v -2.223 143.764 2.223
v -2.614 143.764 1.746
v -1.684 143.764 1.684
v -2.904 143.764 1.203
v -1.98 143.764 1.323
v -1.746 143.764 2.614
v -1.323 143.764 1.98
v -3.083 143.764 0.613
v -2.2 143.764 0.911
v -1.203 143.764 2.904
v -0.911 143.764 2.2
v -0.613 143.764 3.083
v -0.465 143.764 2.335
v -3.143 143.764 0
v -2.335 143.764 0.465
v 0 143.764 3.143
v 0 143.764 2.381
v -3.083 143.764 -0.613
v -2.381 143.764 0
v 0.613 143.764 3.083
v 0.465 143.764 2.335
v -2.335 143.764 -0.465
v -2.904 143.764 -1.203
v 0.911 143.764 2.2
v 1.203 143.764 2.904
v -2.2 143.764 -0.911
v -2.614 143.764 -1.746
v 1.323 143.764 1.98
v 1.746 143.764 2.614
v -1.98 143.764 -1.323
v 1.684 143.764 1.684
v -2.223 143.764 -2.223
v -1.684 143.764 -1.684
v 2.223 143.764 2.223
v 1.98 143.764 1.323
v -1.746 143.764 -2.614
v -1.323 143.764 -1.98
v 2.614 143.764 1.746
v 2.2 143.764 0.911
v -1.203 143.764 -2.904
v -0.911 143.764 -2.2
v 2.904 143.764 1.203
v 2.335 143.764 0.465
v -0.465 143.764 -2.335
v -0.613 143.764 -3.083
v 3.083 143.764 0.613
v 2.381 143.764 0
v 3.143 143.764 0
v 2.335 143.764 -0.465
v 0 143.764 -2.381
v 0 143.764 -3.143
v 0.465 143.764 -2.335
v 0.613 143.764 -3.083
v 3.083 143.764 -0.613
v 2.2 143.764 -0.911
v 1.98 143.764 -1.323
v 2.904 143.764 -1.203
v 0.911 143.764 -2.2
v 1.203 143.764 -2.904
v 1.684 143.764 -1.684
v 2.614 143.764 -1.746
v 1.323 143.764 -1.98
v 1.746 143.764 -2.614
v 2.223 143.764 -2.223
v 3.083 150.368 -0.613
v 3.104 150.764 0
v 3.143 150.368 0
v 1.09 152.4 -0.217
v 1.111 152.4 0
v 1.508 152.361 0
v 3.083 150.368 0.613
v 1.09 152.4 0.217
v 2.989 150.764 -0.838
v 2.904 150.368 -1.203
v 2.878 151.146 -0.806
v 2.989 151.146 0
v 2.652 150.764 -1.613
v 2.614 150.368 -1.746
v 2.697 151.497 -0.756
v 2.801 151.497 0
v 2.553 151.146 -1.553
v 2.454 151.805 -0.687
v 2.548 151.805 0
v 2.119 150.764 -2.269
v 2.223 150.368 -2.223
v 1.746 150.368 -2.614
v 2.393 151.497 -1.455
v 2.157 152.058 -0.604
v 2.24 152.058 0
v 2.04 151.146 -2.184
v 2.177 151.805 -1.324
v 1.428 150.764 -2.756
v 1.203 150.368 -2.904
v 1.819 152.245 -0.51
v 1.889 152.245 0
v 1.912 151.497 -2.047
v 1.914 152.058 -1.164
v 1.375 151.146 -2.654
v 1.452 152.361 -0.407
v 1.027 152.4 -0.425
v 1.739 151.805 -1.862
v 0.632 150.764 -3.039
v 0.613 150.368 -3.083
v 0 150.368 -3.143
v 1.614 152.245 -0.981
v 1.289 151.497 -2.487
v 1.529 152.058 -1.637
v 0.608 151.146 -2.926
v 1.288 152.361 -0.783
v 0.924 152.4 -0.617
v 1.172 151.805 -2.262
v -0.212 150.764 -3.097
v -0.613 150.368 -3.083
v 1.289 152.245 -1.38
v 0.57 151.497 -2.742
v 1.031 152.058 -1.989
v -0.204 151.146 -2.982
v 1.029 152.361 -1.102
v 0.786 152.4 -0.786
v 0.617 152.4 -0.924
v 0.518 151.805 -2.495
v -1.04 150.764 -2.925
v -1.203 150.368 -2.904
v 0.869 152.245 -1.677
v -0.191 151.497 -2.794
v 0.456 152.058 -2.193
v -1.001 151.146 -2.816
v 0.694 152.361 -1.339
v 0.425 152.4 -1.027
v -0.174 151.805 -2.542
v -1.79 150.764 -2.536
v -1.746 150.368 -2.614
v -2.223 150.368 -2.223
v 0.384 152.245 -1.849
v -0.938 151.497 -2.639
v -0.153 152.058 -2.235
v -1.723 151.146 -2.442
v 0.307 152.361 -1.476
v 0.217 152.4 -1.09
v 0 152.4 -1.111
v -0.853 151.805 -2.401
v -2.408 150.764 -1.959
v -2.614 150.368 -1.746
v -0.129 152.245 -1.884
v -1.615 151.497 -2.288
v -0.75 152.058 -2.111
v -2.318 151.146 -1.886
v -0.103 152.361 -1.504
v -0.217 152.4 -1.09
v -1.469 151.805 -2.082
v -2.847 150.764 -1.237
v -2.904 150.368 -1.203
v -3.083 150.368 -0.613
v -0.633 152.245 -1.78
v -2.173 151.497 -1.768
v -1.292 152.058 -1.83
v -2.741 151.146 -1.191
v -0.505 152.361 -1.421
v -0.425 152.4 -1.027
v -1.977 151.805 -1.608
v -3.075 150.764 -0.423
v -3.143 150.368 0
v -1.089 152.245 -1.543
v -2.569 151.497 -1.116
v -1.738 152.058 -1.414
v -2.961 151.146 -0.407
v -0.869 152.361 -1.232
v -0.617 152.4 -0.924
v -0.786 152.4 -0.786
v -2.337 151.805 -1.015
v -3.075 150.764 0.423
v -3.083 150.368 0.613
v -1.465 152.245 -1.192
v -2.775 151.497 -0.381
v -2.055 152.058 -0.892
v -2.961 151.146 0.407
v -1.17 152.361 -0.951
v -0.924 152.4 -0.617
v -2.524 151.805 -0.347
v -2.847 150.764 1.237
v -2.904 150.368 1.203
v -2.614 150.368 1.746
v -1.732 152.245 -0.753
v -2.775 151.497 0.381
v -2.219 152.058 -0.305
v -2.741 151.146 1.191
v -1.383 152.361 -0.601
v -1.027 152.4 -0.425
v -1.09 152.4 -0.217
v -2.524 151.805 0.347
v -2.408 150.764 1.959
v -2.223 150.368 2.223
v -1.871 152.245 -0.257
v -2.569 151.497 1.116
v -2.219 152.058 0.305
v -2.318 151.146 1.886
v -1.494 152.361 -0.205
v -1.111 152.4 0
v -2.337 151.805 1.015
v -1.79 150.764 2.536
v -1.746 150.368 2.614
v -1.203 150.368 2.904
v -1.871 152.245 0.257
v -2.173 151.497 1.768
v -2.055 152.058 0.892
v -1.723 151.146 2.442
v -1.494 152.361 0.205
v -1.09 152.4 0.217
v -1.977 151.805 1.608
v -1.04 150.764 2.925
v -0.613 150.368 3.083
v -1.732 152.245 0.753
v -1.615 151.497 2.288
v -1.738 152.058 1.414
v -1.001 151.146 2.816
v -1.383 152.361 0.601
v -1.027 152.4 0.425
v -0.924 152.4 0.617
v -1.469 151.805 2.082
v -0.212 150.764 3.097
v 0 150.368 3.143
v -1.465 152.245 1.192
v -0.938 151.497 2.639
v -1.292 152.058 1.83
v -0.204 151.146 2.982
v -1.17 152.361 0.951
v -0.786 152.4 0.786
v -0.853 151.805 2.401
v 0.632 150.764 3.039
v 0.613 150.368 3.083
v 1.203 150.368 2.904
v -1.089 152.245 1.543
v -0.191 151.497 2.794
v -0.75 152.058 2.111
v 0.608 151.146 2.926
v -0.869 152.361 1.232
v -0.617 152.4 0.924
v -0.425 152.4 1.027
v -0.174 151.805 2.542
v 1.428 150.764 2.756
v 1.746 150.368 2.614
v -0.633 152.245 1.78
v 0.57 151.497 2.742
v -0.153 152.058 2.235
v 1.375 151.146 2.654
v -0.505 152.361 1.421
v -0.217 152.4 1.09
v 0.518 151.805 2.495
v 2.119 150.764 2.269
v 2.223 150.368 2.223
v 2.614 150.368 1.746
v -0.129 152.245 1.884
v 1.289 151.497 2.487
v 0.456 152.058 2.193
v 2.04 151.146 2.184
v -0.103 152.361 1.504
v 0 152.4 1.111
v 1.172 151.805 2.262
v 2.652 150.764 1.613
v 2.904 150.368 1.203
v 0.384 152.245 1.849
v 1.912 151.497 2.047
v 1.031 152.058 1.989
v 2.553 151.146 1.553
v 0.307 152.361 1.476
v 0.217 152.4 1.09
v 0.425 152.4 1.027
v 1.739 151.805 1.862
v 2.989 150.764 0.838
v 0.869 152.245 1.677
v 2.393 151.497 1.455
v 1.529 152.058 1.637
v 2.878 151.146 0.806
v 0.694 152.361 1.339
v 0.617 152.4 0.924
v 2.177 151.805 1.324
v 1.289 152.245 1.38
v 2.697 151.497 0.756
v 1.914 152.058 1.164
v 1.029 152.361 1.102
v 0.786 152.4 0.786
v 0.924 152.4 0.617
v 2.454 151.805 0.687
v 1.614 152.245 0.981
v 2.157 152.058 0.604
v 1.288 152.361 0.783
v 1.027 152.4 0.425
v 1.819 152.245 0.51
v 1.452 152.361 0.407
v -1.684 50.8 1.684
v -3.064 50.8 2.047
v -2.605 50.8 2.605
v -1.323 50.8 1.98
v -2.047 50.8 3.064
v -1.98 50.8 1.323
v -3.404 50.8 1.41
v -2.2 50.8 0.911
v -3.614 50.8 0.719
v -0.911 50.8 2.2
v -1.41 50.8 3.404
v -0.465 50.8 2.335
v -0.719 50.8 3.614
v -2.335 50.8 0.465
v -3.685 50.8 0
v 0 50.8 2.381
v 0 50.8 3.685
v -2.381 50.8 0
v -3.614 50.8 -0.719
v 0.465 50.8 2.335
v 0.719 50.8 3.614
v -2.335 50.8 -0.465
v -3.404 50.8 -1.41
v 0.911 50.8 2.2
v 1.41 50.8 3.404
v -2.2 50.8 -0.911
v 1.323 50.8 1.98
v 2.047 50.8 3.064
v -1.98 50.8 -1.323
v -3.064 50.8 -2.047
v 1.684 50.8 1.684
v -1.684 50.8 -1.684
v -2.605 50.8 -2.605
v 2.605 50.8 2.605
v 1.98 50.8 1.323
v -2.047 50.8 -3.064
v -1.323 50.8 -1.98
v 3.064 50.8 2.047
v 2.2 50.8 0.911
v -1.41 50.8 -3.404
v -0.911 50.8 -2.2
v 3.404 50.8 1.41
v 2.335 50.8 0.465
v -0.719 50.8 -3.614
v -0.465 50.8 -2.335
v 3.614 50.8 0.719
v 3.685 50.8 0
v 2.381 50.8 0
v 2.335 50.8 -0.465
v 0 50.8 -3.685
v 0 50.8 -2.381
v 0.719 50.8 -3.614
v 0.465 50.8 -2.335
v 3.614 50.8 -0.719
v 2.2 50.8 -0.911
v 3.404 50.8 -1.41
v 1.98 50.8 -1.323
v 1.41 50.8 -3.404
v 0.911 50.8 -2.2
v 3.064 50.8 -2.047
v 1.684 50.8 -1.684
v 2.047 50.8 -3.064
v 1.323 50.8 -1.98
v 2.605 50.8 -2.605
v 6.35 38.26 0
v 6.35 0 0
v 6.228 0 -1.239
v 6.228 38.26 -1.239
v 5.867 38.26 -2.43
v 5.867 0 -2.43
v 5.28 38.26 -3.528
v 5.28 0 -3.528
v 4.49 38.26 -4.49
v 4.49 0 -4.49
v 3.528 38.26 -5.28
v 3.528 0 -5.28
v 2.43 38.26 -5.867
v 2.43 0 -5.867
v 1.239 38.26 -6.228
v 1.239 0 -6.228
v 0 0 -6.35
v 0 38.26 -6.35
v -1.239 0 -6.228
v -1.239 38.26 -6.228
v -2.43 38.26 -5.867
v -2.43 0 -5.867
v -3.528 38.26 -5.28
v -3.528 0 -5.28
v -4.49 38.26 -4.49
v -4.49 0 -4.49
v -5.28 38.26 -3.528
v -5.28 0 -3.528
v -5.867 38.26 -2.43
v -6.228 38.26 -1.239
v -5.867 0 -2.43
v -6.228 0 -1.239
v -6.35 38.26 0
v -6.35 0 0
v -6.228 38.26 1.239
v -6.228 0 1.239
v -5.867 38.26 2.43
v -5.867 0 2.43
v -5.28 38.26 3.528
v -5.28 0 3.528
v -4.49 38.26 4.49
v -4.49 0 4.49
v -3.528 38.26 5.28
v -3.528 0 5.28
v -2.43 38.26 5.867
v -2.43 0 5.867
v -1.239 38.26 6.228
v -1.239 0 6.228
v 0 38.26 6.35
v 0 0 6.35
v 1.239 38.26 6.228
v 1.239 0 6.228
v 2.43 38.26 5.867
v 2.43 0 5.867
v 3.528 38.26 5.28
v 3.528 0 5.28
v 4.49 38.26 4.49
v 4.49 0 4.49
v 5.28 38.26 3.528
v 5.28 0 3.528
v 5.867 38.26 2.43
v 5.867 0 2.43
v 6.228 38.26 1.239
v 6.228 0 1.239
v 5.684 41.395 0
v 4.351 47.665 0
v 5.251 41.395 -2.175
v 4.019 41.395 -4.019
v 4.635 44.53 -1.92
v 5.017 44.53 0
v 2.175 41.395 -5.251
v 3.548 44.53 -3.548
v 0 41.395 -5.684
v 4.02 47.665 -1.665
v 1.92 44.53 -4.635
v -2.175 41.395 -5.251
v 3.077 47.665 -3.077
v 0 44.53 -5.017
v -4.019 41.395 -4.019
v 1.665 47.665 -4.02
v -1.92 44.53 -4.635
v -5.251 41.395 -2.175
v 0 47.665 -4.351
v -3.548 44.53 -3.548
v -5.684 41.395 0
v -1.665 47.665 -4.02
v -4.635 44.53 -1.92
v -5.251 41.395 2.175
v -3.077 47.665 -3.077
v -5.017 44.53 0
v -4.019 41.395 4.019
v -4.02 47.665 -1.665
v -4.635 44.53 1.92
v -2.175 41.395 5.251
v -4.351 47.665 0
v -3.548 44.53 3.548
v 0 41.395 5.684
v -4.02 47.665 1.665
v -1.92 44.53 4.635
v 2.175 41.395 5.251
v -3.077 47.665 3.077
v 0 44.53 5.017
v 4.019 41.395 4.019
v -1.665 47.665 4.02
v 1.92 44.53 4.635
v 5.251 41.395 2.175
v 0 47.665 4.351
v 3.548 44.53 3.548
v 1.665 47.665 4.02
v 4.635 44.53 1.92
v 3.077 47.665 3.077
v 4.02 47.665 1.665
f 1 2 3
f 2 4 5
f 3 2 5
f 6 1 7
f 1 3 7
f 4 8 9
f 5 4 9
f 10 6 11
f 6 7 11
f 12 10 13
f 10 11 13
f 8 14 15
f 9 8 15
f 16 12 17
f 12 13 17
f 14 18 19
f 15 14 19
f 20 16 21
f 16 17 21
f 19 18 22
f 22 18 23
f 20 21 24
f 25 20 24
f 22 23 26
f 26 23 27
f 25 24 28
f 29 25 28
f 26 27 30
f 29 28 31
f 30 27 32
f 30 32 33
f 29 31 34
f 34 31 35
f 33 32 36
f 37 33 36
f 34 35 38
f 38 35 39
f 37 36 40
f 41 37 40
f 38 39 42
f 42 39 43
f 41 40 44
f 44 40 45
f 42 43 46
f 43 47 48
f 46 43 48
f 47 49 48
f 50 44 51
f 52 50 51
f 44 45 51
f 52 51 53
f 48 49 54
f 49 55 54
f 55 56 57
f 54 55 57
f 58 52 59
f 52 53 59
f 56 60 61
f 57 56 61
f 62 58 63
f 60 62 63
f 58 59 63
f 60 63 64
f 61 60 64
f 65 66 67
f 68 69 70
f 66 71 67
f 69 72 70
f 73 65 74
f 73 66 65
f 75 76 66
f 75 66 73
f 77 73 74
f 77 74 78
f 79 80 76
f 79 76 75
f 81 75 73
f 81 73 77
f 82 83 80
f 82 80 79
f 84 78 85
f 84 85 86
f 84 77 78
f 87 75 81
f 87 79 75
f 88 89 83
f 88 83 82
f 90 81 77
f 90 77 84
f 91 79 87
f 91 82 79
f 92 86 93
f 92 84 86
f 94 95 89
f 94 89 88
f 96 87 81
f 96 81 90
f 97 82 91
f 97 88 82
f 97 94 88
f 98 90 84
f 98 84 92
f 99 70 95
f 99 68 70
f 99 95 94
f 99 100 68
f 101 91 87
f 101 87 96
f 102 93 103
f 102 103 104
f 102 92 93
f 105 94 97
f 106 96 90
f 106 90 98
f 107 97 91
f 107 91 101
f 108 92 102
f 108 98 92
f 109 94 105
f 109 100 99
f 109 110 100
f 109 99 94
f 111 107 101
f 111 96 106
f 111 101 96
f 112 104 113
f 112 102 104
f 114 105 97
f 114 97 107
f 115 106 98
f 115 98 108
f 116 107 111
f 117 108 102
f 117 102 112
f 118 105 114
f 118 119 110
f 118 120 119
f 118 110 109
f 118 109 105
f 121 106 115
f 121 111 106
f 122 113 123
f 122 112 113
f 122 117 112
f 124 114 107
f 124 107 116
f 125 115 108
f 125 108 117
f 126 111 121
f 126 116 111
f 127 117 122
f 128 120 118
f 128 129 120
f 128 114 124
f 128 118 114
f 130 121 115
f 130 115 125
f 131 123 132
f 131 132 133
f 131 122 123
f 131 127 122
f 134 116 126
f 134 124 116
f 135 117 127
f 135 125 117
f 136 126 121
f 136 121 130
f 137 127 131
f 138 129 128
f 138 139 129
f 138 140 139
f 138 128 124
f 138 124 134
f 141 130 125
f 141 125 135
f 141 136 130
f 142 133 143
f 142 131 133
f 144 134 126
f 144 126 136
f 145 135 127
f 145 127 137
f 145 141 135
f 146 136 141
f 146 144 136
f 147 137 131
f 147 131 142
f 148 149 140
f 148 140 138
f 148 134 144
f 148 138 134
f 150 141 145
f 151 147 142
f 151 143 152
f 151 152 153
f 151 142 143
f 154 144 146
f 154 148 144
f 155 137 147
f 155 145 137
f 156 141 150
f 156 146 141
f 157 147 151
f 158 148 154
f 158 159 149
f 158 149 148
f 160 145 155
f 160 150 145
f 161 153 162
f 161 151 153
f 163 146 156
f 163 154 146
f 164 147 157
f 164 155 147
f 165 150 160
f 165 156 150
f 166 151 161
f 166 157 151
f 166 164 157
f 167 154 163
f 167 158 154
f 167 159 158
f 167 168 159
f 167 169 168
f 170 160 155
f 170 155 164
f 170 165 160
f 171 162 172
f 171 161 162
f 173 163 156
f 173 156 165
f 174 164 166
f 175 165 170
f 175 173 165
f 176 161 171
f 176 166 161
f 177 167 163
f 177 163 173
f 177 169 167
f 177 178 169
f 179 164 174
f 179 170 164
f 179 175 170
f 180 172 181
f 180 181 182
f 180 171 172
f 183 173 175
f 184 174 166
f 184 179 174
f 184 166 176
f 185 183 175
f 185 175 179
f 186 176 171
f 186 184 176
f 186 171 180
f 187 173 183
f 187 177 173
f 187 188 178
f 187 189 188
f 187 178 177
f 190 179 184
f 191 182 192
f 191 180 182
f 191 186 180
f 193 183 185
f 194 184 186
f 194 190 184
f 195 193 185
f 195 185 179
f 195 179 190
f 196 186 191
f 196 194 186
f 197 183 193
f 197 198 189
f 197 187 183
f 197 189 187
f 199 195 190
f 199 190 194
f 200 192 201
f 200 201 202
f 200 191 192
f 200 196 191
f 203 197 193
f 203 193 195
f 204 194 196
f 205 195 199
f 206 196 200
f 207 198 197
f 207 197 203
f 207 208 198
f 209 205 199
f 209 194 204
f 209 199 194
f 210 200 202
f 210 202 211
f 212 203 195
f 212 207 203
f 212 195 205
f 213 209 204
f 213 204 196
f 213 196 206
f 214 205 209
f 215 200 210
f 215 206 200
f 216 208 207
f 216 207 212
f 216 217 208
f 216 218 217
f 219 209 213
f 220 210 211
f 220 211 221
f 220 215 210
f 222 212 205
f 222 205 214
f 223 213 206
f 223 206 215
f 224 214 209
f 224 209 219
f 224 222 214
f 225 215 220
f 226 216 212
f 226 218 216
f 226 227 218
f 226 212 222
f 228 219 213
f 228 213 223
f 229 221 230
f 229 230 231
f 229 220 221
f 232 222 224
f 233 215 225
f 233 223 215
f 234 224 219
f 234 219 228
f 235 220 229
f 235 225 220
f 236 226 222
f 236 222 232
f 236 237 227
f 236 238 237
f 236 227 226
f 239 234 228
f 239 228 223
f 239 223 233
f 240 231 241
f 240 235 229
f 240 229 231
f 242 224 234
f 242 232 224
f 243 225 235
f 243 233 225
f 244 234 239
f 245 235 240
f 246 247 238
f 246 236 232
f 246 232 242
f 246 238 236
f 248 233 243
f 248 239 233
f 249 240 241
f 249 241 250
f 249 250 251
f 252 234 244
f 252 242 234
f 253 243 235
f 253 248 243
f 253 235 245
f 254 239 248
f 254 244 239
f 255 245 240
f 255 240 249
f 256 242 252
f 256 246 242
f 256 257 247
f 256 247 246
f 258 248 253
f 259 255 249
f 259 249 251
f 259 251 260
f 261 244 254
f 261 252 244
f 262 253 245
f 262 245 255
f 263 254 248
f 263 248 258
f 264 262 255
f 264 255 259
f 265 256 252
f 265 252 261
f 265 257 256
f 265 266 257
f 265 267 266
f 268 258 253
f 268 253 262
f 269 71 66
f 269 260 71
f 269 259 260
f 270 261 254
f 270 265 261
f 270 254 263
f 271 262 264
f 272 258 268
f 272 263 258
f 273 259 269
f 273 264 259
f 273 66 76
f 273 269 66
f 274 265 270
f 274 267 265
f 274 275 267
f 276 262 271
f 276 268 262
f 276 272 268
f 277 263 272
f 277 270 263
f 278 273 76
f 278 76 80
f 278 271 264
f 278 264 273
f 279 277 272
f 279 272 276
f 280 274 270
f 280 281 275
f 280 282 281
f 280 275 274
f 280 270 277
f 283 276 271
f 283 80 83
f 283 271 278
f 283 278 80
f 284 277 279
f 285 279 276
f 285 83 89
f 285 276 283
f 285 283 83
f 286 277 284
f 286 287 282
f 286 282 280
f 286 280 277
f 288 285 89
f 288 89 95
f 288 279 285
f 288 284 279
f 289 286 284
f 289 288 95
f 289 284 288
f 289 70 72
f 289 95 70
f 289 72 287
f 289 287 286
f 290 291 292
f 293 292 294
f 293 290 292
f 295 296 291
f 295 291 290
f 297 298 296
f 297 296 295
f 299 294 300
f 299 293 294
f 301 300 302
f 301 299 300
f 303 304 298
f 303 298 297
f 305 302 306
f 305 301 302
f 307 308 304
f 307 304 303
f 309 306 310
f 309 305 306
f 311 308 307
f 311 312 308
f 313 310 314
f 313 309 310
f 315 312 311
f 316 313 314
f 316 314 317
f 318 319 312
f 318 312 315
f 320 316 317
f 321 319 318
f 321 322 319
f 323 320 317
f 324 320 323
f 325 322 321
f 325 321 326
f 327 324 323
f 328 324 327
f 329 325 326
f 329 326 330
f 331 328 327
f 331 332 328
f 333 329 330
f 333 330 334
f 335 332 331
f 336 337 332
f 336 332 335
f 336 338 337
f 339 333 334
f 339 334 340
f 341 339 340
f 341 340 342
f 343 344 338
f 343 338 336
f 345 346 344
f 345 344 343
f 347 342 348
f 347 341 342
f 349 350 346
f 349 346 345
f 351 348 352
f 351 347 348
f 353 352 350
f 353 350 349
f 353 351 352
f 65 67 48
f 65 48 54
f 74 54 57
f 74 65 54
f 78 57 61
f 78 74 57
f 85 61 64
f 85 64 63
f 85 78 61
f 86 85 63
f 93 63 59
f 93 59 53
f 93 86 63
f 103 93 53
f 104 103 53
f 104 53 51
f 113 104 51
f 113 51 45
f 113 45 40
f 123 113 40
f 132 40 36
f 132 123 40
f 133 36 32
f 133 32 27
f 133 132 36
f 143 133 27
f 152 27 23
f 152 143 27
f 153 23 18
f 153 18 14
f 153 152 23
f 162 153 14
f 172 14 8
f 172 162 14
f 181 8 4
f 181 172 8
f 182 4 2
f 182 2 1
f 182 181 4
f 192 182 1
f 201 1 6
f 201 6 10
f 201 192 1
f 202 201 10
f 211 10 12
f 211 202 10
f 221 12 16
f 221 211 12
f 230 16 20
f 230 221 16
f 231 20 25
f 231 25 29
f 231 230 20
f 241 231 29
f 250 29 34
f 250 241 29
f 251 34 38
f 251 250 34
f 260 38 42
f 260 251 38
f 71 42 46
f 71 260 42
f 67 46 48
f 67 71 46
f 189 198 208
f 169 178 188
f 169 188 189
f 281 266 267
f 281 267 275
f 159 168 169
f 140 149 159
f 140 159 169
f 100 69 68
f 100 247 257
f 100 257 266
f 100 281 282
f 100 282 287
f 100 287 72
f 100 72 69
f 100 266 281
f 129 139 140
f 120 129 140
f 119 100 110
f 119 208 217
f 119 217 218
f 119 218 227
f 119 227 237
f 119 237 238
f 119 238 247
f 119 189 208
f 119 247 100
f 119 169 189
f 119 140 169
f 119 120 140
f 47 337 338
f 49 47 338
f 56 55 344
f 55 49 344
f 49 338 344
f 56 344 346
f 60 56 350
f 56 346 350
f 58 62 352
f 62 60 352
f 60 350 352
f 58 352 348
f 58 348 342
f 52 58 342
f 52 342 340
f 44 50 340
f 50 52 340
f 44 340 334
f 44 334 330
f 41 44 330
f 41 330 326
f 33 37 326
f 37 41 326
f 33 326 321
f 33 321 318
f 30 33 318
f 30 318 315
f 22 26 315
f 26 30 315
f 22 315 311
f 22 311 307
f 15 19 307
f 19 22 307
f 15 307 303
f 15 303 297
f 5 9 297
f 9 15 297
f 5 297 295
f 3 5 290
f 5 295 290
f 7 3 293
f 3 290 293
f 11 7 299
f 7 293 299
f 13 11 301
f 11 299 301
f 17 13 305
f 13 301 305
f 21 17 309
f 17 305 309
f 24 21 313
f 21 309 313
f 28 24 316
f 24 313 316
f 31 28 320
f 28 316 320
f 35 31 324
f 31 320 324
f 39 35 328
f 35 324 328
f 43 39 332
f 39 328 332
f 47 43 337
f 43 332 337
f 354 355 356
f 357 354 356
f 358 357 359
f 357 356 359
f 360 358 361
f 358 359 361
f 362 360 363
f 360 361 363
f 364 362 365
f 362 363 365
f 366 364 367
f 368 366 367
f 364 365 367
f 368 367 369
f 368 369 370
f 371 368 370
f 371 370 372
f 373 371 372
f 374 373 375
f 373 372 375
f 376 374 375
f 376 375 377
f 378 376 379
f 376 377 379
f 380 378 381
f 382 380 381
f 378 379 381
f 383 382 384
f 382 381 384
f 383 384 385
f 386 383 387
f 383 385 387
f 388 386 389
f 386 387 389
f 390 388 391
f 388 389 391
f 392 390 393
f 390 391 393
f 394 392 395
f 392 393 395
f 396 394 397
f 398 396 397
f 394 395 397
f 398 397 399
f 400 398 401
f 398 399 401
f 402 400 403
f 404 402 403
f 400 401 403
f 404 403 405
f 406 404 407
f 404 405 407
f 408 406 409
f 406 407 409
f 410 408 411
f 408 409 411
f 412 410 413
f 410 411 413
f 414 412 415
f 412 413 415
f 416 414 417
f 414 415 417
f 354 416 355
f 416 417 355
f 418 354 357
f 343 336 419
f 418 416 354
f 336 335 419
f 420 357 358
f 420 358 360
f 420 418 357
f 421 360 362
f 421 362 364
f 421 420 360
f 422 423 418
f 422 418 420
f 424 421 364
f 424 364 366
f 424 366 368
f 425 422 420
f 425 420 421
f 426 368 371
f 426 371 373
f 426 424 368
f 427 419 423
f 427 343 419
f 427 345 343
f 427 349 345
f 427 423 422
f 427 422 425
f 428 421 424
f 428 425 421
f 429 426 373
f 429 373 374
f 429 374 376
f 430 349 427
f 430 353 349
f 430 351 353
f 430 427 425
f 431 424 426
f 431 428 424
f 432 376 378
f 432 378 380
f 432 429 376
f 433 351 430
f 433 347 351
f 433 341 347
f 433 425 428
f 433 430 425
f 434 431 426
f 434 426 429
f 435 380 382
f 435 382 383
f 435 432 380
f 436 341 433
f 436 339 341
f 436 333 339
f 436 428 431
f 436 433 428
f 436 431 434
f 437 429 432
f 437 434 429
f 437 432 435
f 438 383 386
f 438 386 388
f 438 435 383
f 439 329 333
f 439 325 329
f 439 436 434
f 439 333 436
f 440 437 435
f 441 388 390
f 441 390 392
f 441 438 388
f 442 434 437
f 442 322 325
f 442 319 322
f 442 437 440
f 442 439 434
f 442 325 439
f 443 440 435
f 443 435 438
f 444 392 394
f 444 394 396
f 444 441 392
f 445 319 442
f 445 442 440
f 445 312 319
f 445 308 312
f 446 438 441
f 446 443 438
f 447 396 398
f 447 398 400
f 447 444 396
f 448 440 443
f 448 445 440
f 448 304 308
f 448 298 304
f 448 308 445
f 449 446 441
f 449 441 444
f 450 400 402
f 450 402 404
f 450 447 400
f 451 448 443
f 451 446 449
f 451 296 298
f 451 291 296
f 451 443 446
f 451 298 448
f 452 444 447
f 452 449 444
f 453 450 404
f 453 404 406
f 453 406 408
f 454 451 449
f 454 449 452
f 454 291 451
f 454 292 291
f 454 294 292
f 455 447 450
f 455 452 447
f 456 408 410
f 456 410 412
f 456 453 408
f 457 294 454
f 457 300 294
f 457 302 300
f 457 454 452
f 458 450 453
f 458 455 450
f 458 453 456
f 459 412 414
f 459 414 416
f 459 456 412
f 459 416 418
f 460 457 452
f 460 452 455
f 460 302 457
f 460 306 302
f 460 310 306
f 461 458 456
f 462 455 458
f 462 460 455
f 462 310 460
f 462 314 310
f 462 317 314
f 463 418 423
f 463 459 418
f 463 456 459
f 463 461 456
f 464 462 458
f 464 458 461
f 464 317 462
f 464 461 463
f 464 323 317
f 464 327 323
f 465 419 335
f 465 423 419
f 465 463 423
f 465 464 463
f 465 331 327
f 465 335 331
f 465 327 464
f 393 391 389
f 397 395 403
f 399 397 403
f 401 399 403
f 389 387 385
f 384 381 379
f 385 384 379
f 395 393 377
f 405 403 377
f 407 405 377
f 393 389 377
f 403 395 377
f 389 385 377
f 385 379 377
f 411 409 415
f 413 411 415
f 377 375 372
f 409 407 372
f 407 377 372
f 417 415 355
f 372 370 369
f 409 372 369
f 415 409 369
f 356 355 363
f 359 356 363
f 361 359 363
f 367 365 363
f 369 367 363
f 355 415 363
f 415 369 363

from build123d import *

# Parameters (mm, degrees)
SKETCH1_R           = 2.38125
BOSS_EXTRUDE1_DEPTH = 152.4
SKETCH2_R           = 6.35
BOSS_EXTRUDE2_DEPTH = 50.8
CHAMFER1_SIZE       = 12.54
CHAMFER1_SIZE2      = 2.665459283
SKETCH3_R           = 3.14325
BOSS_EXTRUDE3_DEPTH = 8.636
FILLET1_R           = 2.032


with BuildPart() as part:
    # Sketch1 → Boss-Extrude1 (new body)
    with BuildSketch(Plane(origin=(0, 0, 0), x_dir=(1, 0, 0), z_dir=(0, 1, 0))):
        Circle(SKETCH1_R)
    extrude(amount=BOSS_EXTRUDE1_DEPTH)

    # Sketch2 → Boss-Extrude2 (add)
    with BuildSketch(Plane(origin=(0, 0, 0), x_dir=(1, 0, 0), z_dir=(0, 1, 0))):
        Circle(SKETCH2_R)
    extrude(amount=BOSS_EXTRUDE2_DEPTH)

    # Chamfer1
    chamfer1_edges = [part.edges().sort_by_distance(p)[0] for p in [
        (-6.35, 50.8, 0),
    ]]
    chamfer1_side = [part.faces().sort_by_distance(p)[0] for p in [
        (-6.35, 25.4, 0),
    ]]
    chamfer(chamfer1_edges, length=CHAMFER1_SIZE, length2=CHAMFER1_SIZE2, reference=chamfer1_side[0])

    # Sketch3 → Boss-Extrude3 (add)
    with BuildSketch(Plane(origin=(0, 152.4, 0), x_dir=(1, 0, 0), z_dir=(0, 1, 0))):
        Circle(SKETCH3_R)
    extrude(amount=-BOSS_EXTRUDE3_DEPTH)

    # Fillet1
    fillet1_edges = [part.edges().sort_by_distance(p)[0] for p in [
        (-3.14325, 152.4, 0),
    ]]
    fillet(fillet1_edges, radius=FILLET1_R)


solid = part.part
